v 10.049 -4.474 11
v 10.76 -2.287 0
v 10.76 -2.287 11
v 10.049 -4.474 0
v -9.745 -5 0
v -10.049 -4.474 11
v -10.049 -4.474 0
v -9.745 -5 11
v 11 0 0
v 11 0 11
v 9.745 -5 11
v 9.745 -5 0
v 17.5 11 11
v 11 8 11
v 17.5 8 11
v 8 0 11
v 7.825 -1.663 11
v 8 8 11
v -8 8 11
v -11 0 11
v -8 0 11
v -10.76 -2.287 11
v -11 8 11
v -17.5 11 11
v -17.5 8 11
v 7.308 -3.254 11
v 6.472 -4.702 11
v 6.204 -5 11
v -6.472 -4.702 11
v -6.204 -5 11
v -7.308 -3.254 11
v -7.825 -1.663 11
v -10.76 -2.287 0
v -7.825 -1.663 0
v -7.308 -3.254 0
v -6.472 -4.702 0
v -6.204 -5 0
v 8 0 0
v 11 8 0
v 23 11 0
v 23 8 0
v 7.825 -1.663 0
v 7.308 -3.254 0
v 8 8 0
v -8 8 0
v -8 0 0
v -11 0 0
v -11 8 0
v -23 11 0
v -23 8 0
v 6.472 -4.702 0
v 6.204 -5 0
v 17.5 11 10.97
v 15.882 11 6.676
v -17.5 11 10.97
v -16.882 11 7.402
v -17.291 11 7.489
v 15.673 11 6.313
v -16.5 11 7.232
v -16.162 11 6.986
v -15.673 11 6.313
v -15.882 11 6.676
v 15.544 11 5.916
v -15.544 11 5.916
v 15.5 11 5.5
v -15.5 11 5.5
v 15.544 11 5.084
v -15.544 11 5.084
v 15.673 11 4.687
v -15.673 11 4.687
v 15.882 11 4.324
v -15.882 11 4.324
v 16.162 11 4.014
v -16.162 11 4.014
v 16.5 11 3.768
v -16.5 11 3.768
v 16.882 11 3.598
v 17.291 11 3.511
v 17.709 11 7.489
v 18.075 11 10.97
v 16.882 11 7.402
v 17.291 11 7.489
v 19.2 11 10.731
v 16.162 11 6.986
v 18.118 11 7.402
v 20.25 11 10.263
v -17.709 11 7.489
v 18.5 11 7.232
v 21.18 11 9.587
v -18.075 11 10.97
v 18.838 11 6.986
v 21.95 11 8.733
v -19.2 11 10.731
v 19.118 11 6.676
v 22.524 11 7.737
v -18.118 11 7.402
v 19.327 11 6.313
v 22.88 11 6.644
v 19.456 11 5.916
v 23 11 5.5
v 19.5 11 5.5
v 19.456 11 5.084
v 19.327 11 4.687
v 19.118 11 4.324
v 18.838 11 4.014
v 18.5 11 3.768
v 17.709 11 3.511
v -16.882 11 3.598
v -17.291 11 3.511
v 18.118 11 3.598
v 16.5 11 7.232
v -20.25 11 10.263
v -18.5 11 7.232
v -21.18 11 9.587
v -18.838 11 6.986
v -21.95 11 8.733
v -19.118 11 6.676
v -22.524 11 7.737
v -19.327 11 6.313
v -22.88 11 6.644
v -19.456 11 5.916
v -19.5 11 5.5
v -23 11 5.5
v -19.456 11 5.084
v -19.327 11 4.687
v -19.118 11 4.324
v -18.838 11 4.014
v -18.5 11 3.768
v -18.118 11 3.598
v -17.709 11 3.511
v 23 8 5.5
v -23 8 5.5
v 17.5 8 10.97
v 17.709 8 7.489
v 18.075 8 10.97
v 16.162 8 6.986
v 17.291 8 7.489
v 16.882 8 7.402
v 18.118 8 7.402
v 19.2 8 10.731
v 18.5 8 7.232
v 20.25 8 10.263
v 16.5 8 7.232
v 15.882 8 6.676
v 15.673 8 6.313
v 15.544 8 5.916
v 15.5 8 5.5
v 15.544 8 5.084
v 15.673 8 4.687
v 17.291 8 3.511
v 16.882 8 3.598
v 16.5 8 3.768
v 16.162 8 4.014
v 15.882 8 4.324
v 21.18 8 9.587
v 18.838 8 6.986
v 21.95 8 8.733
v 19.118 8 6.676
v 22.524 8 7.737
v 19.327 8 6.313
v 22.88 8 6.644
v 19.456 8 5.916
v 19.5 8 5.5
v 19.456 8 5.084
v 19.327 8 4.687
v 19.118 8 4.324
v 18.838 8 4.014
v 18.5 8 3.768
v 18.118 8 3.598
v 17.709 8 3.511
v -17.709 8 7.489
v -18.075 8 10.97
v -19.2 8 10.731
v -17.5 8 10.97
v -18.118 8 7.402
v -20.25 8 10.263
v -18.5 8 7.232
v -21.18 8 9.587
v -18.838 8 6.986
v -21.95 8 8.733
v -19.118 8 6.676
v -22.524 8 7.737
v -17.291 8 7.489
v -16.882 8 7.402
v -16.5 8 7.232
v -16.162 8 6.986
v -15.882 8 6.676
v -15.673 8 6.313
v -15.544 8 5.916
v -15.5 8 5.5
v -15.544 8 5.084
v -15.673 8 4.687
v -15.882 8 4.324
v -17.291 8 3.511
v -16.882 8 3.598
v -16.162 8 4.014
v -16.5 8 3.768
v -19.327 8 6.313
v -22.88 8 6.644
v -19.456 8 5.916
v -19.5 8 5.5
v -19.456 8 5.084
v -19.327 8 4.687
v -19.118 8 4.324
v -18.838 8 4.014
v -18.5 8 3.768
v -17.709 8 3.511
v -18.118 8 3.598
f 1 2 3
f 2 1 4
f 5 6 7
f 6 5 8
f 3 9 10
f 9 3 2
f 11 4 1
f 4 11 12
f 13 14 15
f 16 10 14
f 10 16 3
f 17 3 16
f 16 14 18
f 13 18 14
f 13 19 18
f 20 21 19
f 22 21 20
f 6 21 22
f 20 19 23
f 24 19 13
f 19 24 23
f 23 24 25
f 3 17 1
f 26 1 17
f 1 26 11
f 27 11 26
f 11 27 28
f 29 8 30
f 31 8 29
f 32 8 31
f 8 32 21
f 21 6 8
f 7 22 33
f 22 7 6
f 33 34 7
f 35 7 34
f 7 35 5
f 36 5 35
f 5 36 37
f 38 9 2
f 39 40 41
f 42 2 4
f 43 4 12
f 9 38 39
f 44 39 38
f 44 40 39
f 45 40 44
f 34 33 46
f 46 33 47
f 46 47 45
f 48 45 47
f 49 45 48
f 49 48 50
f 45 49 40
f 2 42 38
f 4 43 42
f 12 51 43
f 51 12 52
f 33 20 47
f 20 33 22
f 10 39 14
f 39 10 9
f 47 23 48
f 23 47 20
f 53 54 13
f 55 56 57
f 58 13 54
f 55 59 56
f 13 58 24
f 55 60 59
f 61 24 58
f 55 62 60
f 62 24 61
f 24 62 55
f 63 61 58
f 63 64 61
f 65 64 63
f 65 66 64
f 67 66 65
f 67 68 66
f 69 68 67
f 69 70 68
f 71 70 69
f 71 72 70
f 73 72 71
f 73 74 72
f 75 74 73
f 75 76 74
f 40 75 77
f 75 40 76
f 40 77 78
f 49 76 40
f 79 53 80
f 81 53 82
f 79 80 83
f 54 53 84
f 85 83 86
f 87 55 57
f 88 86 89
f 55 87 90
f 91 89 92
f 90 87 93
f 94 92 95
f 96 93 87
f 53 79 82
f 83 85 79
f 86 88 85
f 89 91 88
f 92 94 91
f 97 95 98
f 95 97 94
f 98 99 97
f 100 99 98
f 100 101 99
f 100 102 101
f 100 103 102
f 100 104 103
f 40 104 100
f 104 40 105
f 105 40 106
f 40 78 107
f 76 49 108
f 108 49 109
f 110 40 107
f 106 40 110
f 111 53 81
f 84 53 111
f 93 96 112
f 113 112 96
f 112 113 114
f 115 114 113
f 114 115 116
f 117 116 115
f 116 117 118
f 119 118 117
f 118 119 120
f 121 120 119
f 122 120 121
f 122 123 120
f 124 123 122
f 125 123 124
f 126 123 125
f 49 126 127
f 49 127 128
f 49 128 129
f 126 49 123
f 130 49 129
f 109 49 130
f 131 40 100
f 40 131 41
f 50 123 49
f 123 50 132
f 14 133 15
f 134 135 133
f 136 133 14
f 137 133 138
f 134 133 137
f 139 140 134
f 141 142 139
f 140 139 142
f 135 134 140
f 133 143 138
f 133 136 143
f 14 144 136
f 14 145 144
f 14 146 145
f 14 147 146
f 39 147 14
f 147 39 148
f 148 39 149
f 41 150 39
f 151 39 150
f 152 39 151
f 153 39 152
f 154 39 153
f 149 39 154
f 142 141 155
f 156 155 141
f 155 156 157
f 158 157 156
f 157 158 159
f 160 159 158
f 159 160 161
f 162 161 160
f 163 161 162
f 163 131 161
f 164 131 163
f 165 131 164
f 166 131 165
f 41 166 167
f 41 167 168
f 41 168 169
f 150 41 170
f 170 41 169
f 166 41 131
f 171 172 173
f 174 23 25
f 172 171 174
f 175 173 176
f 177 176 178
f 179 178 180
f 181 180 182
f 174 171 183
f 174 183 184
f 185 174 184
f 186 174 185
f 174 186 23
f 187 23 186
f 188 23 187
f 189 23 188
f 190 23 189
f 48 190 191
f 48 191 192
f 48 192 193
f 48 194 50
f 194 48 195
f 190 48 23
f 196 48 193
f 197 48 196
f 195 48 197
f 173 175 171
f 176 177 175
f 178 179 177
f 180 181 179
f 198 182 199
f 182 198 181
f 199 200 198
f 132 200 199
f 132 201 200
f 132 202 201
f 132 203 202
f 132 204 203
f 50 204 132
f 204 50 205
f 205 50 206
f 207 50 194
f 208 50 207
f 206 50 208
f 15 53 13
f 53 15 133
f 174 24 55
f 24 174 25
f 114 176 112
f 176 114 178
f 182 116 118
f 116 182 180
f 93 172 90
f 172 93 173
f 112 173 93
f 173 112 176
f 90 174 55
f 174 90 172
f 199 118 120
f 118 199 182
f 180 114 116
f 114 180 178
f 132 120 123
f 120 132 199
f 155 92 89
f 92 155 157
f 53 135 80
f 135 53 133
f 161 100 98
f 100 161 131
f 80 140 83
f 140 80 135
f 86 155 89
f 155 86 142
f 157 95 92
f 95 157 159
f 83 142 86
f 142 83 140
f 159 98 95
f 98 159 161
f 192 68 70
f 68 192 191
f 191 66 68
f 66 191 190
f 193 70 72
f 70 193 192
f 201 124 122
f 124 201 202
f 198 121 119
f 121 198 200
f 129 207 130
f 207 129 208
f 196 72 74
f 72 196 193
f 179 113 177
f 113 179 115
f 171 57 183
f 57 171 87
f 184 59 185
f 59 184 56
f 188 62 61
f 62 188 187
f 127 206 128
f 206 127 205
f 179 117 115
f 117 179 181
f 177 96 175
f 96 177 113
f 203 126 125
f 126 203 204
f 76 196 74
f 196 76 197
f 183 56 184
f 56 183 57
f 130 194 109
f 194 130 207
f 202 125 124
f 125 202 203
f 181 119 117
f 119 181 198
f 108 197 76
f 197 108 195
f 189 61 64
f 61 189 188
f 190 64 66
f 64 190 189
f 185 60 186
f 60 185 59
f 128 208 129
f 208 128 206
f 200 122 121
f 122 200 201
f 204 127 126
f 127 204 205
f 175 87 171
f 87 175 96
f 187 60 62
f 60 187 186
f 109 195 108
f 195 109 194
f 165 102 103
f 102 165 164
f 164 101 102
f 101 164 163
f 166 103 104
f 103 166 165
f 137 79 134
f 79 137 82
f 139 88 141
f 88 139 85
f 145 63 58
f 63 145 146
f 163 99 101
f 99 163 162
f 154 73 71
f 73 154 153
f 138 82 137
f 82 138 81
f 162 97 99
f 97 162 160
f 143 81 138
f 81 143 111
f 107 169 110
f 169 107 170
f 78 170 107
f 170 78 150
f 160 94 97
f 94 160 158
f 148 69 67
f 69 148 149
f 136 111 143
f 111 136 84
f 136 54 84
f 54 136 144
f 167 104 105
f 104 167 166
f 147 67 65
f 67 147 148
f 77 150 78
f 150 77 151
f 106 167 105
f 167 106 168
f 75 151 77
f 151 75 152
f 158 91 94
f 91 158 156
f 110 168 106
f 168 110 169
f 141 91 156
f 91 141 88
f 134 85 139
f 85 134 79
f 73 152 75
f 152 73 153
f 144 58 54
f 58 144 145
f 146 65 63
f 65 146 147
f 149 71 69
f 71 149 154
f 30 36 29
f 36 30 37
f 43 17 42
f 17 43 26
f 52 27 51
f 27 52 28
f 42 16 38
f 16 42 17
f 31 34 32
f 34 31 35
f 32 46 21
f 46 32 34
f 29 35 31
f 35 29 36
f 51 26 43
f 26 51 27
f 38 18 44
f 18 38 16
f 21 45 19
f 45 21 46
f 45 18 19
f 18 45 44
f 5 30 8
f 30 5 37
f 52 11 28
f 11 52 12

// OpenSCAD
bushingod = 16;
bushingheight = 11;
holedia = 4;
wall = 3;

$fn = 30;

difference(){
	union(){
		translate([0,0,0])cylinder(r=bushingod/2+wall, h=bushingheight);
		translate([-bushingod/2-wall,0,0])cube([bushingod+wall*2,bushingod/2+wall,bushingheight]);
		translate([-(bushingod+wall*2+holedia*6)/2,bushingod/2,0])cube([bushingod+wall*2+holedia*6,wall,bushingheight/2]);
		translate([-(bushingod+wall+holedia*4)/2,bushingod/2,0])cube([bushingod+wall*2+holedia*3.25,wall,bushingheight]);
		translate([-(bushingod+wall+holedia*4)/2,bushingod/2,bushingheight/2])rotate([-90,0,0])cylinder(r=bushingheight/2, h=wall);
		translate([(bushingod+wall+holedia*4)/2,bushingod/2,bushingheight/2])rotate([-90,0,0])cylinder(r=bushingheight/2, h=wall);



	}
	translate([-(bushingod+wall+holedia*4)/2,bushingod/2-1,bushingheight/2])rotate([-90,0,0])cylinder(r=holedia/2, h=wall+2);
	translate([(bushingod+wall+holedia*4)/2,bushingod/2-1,bushingheight/2])rotate([-90,0,0])cylinder(r=holedia/2, h=wall+2);
	translate([0,0,0])cylinder(r=bushingod/2, h=bushingheight);
	translate([-bushingod/2,0,0])cube([bushingod,bushingod/2,bushingheight]);
	translate([-bushingod/2-wall,-bushingod/4*3,0])cube([bushingod+wall*2,bushingod/4+wall,bushingheight]);
}
